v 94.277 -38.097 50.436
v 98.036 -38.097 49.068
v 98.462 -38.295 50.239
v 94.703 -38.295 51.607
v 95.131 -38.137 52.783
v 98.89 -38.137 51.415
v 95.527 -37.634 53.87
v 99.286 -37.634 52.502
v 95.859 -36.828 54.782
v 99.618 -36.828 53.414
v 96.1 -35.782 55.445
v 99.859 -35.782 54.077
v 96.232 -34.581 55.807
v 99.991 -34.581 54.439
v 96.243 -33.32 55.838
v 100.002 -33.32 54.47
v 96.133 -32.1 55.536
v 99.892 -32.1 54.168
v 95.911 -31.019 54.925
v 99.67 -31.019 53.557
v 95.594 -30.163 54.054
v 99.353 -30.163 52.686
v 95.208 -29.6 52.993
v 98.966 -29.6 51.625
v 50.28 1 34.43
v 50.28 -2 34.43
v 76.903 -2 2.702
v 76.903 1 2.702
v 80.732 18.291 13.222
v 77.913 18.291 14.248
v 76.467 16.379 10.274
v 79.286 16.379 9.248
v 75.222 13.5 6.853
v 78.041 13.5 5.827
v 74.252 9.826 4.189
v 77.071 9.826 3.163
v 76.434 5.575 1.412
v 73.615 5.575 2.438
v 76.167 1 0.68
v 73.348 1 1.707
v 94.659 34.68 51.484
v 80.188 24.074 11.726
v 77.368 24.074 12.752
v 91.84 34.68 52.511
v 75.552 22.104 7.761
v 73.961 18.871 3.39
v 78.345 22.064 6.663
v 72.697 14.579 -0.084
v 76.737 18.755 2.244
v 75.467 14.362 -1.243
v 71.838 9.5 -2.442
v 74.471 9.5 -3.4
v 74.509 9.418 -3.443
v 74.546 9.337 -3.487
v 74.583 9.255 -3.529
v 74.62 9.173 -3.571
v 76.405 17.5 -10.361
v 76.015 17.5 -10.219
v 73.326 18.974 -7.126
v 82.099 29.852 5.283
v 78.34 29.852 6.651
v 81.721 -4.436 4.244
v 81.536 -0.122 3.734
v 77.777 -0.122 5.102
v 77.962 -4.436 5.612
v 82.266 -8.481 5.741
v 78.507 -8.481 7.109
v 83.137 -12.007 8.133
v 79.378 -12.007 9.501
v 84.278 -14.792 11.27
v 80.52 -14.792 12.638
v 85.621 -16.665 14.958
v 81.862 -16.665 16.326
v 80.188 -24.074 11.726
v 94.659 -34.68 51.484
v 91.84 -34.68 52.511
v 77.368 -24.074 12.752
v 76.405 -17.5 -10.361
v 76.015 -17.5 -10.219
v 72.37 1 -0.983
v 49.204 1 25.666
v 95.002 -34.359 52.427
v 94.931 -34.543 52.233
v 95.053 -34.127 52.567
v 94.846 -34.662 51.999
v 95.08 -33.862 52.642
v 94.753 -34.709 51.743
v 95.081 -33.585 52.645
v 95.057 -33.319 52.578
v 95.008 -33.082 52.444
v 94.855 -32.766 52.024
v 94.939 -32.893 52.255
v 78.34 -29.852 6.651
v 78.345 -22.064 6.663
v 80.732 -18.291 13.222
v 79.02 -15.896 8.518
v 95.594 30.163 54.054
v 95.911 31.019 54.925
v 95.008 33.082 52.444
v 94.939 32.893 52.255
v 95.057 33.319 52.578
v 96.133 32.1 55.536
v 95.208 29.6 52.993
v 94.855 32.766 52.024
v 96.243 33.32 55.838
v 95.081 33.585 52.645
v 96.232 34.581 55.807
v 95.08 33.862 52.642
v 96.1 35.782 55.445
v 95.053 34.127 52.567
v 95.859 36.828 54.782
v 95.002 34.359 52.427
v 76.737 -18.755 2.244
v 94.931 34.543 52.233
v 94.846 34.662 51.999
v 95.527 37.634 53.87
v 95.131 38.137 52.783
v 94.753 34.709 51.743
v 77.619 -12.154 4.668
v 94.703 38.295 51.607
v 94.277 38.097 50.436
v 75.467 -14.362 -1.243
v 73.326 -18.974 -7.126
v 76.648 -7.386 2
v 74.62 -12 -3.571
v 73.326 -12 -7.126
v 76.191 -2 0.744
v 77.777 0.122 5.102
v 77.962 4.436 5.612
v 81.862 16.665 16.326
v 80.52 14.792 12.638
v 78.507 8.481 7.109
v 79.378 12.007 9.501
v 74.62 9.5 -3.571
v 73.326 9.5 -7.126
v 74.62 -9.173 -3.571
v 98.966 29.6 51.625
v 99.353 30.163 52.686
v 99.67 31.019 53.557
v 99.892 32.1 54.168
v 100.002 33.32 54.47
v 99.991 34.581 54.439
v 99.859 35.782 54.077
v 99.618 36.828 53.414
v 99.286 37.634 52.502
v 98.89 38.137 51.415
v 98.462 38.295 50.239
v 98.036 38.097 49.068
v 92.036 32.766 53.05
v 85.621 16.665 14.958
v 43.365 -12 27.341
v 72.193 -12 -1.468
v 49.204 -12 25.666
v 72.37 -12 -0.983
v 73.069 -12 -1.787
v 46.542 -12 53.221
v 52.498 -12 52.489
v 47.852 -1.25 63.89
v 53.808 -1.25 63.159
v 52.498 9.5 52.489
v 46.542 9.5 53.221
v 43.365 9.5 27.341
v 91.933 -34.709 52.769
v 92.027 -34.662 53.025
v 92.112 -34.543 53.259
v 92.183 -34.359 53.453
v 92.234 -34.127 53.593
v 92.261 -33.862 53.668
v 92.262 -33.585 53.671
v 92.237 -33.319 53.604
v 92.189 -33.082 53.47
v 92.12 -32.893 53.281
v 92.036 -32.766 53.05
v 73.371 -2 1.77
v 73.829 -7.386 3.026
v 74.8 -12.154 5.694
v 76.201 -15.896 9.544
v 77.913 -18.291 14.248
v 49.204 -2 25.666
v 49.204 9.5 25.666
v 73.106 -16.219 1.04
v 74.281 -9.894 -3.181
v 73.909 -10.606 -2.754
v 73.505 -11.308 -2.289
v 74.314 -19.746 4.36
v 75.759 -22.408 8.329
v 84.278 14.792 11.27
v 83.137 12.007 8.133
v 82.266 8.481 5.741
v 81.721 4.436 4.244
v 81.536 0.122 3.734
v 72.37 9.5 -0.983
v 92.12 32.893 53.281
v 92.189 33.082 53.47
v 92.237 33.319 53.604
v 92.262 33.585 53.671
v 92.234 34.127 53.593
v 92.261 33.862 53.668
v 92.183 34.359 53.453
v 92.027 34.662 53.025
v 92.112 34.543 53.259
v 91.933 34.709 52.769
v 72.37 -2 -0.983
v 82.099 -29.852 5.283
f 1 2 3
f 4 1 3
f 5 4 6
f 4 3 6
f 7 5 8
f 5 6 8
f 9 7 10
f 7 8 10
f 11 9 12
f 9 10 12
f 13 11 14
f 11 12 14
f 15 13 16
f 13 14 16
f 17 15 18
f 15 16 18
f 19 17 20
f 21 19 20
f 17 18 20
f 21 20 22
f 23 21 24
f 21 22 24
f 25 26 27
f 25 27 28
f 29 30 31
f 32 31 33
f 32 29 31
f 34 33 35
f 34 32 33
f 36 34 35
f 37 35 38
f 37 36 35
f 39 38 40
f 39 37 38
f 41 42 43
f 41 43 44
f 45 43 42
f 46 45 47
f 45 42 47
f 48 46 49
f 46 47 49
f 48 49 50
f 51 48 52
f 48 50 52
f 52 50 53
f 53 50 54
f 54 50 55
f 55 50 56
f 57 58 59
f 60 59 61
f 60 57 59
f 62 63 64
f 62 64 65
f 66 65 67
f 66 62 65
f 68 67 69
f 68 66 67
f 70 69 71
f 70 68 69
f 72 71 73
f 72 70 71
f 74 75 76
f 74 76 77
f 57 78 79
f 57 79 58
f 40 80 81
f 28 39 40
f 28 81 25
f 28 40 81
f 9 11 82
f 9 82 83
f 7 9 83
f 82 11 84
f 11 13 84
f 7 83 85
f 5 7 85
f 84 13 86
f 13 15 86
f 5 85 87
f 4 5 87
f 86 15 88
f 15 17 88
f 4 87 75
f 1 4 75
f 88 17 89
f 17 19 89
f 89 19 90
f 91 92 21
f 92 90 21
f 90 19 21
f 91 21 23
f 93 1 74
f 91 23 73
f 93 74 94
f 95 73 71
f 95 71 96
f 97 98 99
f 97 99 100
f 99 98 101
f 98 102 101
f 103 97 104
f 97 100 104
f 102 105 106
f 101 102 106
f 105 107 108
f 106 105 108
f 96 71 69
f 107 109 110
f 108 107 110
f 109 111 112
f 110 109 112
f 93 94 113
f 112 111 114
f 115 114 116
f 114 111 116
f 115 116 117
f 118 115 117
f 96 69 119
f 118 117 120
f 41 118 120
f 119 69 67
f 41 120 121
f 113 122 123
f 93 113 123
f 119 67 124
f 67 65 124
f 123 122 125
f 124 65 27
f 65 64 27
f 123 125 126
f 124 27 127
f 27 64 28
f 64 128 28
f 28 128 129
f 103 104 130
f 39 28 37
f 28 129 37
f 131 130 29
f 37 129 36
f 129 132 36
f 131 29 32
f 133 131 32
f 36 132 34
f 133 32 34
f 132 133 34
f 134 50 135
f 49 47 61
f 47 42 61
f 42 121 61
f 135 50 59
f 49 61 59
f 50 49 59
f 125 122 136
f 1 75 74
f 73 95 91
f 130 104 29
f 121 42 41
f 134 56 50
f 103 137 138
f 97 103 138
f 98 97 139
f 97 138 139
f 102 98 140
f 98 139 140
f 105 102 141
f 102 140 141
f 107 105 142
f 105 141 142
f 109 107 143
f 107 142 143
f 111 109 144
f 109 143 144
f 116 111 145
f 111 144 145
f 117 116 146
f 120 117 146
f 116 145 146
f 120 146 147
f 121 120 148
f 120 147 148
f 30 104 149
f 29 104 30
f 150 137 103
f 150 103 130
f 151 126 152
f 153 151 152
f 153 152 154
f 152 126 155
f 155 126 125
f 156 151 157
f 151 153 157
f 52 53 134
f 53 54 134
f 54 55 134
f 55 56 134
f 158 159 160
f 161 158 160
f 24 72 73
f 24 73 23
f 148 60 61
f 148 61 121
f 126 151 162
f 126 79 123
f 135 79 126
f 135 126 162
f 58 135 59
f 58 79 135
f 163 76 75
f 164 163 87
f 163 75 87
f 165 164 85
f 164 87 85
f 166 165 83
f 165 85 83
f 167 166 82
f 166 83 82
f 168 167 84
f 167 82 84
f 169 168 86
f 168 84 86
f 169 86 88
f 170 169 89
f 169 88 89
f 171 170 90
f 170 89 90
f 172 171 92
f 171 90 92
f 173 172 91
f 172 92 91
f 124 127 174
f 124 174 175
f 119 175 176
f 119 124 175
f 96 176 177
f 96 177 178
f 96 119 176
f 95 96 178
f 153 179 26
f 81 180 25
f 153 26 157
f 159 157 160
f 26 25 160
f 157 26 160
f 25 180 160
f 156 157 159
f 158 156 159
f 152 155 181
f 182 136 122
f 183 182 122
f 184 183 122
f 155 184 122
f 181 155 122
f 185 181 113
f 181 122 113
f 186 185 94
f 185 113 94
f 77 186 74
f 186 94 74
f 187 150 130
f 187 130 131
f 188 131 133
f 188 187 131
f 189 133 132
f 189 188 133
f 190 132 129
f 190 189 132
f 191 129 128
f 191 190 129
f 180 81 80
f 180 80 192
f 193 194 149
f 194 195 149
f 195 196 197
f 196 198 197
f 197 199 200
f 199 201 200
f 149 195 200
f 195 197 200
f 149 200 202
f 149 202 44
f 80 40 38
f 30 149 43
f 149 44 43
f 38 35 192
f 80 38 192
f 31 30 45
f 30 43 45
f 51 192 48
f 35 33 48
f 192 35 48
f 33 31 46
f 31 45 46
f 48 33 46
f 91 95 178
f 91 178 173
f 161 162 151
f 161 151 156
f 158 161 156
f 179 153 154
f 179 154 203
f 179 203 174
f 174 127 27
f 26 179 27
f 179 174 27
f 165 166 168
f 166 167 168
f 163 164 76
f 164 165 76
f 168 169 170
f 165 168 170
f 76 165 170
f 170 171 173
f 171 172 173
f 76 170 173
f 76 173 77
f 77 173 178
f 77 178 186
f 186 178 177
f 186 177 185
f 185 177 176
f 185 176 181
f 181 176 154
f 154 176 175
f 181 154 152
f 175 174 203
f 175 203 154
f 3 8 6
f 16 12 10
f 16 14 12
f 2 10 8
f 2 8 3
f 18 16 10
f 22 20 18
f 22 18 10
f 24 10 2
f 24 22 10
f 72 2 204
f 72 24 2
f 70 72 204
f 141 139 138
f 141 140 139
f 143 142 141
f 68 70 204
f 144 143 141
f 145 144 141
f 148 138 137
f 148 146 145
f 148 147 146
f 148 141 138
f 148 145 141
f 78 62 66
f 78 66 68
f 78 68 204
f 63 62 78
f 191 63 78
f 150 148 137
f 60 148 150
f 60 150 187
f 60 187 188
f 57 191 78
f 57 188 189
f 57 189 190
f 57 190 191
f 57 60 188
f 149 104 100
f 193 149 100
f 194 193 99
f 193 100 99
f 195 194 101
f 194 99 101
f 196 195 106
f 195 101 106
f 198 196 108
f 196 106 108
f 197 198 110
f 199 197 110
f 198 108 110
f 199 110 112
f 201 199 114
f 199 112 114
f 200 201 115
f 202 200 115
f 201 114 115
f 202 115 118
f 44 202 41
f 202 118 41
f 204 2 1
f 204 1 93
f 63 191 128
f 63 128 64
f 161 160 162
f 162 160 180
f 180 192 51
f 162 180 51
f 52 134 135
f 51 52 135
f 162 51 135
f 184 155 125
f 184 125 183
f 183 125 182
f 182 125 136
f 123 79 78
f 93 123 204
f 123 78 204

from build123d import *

# Parameters (mm, degrees)
BOX033_W               = 5
BOX033_H               = 49
BOX033_DEPTH           = 74
BOX033_PITCH_ANGLE     = 29
PAD001_DEPTH           = 4
PAD_DEPTH              = 4
EXTRUDE044_DEPTH       = 6
EXTRUDE044_PITCH_ANGLE = -13
BOX032_W               = 47
BOX032_H               = 35
BOX032_DEPTH           = 12
BOX021_W               = 10
BOX021_H               = 3
BOX021_DEPTH           = 49
BOX021_PLACEMENT_ANGLE = 30
BOX020_W               = 5
BOX020_H               = 21.5
BOX020_DEPTH           = 52
BOX020_PITCH_ANGLE     = 29
CUT035_PLACEMENT_ANGLE = 70


with BuildPart() as w_rfel032:
    # Box033 → Box033 (new body)
    with BuildSketch(Plane.XY):
        with Locations((2.5, 24.5)):
            Rectangle(BOX033_W, BOX033_H)
    extrude(amount=BOX033_DEPTH)


with BuildPart() as w_rfel032_1:
    # Box033 pitch: moved
    add(w_rfel032.part.rotate(Axis((0, 0, 0), (0, 1, 0)), BOX033_PITCH_ANGLE))


with BuildPart() as w_rfel032_2:
    # Box033 placement: moved
    add(w_rfel032_1.part.moved(Location((-34, -29, 0))))


with BuildPart() as pad001:
    # Sketch021 → Pad001 (new body)
    with BuildSketch(Plane.XY.offset(3)):
        with BuildLine():
            Line((-23.358564, -3.63874), (-23.358564, 3.63874))
            ThreePointArc((-6.004676, 24.074331), (-18.054345, 16.720651), (-23.358564, 3.63874))
            Line((-6.004676, 24.074331), (36.3059, 34.679668))
            ThreePointArc((36.87983, 32.765973), (37.506884, 33.996941), (36.3059, 34.679668))
            Line((36.87983, 32.765973), (-4.412486, 18.291349))
            ThreePointArc((-4.412486, 18.291349), (-14.077658, 11.396909), (-17.779108, 0.116478))
            Line((-17.779108, 0.116478), (-17.779108, -0.174905))
            ThreePointArc((-17.779108, -0.174905), (-14.075788, -11.431815), (-4.412486, -18.291349))
            Line((-4.412486, -18.291349), (36.879838, -32.765976))
            ThreePointArc((36.3059, -34.679668), (37.506883, -33.996945), (36.879838, -32.765976))
            Line((36.3059, -34.679668), (-6.004676, -24.074331))
            ThreePointArc((-23.358564, -3.63874), (-18.054345, -16.720651), (-6.004676, -24.074331))
        make_face()
    extrude(amount=PAD001_DEPTH)


with BuildPart() as pad:
    # Sketch020 → Pad (new body)
    with BuildSketch(Plane.XY):
        with BuildLine():
            Line((-28.053126, -17.5), (-28.053126, 17.5))
            Line((-28.053126, 17.5), (-11.404976, 29.852464))
            Line((-11.404976, 29.852464), (35.190344, 38.097016))
            ThreePointArc((37.911252, 29.600454), (40.755985, 35.195389), (35.190344, 38.097016))
            Line((37.911252, 29.600454), (-1.109137, 16.664622))
            ThreePointArc((-1.109137, 16.664622), (-9.755072, 10.323805), (-13.053126, 0.121796))
            Line((-13.053126, 0.121796), (-13.053126, -0.121796))
            ThreePointArc((-13.053126, -0.121796), (-9.755072, -10.323805), (-1.109137, -16.664622))
            Line((-1.109137, -16.664622), (37.911252, -29.600454))
            ThreePointArc((35.190344, -38.097016), (40.755985, -35.195389), (37.911252, -29.600454))
            Line((35.190344, -38.097016), (-11.404976, -29.852464))
            Line((-28.053126, -17.5), (-11.404976, -29.852464))
        make_face()
    extrude(amount=PAD_DEPTH)


with BuildPart() as extrude044:
    # Sketch016 → Extrude044 (new body)
    with BuildSketch(Plane.XY):
        Polygon((23.917763, 0), (13.167763, 10.75), (-16.832237, 10.75), (-16.832237, -10.75), (13.167763, -10.75), align=None)
    extrude(amount=EXTRUDE044_DEPTH)


with BuildPart() as extrude044_1:
    # Extrude044 pitch: moved
    add(extrude044.part.rotate(Axis((0, 0, 0), (0, 1, 0)), EXTRUDE044_PITCH_ANGLE))


with BuildPart() as extrude044_2:
    # Extrude044 placement: moved
    add(extrude044_1.part.moved(Location((10, -1.25, 41))))


with BuildPart() as w_rfel031:
    # Box032 → Box032 (new body)
    with BuildSketch(Plane(origin=(-20, -15, 43), x_dir=(1, 0, 0), z_dir=(0, 0, 1))):
        with Locations((23.5, 17.5)):
            Rectangle(BOX032_W, BOX032_H)
    extrude(amount=BOX032_DEPTH)


with BuildPart() as w_rfel021:
    # Box021 → Box021 (new body)
    with BuildSketch(Plane.XY):
        with Locations((5, 1.5)):
            Rectangle(BOX021_W, BOX021_H)
    extrude(amount=BOX021_DEPTH)


with BuildPart() as w_rfel021_1:
    # Box021 placement: moved
    add(w_rfel021.part.moved(Location((-26, -1, 6))).rotate(Axis((-26, -1, 6), (0, 1, 0)), BOX021_PLACEMENT_ANGLE))


with BuildPart() as stand:
    # Box020 → Box020 (new body)
    with BuildSketch(Plane.XY):
        with Locations((2.5, 10.75)):
            Rectangle(BOX020_W, BOX020_H)
    extrude(amount=BOX020_DEPTH)


with BuildPart() as stand_1:
    # Box020 pitch: moved
    add(stand.part.rotate(Axis((0, 0, 0), (0, 1, 0)), BOX020_PITCH_ANGLE))


with BuildPart() as stand_2:
    # Box020 placement: moved
    add(stand_1.part.moved(Location((-28, -11, 4))))

    # Fusion021: union Würfel021
    add(w_rfel021_1.part)

    # Cut029: cut Würfel031
    add(w_rfel031.part, mode=Mode.SUBTRACT)


with BuildPart() as stand_3:
    # Cut029 placement: moved
    add(stand_2.part.moved(Location((0, -1, 0))))

    # Fusion032: union Pad001, Pad, Extrude044
    add(pad001.part)
    add(pad.part)
    add(extrude044_2.part)

    # Cut035: cut Würfel032
    add(w_rfel032_2.part, mode=Mode.SUBTRACT)


with BuildPart() as stand_4:
    # Cut035 placement: moved
    add(stand_3.part.moved(Location((86, 0, 16))).rotate(Axis((86, 0, 16), (0, -1, 0)), CUT035_PLACEMENT_ANGLE))


solid = stand_4.part
